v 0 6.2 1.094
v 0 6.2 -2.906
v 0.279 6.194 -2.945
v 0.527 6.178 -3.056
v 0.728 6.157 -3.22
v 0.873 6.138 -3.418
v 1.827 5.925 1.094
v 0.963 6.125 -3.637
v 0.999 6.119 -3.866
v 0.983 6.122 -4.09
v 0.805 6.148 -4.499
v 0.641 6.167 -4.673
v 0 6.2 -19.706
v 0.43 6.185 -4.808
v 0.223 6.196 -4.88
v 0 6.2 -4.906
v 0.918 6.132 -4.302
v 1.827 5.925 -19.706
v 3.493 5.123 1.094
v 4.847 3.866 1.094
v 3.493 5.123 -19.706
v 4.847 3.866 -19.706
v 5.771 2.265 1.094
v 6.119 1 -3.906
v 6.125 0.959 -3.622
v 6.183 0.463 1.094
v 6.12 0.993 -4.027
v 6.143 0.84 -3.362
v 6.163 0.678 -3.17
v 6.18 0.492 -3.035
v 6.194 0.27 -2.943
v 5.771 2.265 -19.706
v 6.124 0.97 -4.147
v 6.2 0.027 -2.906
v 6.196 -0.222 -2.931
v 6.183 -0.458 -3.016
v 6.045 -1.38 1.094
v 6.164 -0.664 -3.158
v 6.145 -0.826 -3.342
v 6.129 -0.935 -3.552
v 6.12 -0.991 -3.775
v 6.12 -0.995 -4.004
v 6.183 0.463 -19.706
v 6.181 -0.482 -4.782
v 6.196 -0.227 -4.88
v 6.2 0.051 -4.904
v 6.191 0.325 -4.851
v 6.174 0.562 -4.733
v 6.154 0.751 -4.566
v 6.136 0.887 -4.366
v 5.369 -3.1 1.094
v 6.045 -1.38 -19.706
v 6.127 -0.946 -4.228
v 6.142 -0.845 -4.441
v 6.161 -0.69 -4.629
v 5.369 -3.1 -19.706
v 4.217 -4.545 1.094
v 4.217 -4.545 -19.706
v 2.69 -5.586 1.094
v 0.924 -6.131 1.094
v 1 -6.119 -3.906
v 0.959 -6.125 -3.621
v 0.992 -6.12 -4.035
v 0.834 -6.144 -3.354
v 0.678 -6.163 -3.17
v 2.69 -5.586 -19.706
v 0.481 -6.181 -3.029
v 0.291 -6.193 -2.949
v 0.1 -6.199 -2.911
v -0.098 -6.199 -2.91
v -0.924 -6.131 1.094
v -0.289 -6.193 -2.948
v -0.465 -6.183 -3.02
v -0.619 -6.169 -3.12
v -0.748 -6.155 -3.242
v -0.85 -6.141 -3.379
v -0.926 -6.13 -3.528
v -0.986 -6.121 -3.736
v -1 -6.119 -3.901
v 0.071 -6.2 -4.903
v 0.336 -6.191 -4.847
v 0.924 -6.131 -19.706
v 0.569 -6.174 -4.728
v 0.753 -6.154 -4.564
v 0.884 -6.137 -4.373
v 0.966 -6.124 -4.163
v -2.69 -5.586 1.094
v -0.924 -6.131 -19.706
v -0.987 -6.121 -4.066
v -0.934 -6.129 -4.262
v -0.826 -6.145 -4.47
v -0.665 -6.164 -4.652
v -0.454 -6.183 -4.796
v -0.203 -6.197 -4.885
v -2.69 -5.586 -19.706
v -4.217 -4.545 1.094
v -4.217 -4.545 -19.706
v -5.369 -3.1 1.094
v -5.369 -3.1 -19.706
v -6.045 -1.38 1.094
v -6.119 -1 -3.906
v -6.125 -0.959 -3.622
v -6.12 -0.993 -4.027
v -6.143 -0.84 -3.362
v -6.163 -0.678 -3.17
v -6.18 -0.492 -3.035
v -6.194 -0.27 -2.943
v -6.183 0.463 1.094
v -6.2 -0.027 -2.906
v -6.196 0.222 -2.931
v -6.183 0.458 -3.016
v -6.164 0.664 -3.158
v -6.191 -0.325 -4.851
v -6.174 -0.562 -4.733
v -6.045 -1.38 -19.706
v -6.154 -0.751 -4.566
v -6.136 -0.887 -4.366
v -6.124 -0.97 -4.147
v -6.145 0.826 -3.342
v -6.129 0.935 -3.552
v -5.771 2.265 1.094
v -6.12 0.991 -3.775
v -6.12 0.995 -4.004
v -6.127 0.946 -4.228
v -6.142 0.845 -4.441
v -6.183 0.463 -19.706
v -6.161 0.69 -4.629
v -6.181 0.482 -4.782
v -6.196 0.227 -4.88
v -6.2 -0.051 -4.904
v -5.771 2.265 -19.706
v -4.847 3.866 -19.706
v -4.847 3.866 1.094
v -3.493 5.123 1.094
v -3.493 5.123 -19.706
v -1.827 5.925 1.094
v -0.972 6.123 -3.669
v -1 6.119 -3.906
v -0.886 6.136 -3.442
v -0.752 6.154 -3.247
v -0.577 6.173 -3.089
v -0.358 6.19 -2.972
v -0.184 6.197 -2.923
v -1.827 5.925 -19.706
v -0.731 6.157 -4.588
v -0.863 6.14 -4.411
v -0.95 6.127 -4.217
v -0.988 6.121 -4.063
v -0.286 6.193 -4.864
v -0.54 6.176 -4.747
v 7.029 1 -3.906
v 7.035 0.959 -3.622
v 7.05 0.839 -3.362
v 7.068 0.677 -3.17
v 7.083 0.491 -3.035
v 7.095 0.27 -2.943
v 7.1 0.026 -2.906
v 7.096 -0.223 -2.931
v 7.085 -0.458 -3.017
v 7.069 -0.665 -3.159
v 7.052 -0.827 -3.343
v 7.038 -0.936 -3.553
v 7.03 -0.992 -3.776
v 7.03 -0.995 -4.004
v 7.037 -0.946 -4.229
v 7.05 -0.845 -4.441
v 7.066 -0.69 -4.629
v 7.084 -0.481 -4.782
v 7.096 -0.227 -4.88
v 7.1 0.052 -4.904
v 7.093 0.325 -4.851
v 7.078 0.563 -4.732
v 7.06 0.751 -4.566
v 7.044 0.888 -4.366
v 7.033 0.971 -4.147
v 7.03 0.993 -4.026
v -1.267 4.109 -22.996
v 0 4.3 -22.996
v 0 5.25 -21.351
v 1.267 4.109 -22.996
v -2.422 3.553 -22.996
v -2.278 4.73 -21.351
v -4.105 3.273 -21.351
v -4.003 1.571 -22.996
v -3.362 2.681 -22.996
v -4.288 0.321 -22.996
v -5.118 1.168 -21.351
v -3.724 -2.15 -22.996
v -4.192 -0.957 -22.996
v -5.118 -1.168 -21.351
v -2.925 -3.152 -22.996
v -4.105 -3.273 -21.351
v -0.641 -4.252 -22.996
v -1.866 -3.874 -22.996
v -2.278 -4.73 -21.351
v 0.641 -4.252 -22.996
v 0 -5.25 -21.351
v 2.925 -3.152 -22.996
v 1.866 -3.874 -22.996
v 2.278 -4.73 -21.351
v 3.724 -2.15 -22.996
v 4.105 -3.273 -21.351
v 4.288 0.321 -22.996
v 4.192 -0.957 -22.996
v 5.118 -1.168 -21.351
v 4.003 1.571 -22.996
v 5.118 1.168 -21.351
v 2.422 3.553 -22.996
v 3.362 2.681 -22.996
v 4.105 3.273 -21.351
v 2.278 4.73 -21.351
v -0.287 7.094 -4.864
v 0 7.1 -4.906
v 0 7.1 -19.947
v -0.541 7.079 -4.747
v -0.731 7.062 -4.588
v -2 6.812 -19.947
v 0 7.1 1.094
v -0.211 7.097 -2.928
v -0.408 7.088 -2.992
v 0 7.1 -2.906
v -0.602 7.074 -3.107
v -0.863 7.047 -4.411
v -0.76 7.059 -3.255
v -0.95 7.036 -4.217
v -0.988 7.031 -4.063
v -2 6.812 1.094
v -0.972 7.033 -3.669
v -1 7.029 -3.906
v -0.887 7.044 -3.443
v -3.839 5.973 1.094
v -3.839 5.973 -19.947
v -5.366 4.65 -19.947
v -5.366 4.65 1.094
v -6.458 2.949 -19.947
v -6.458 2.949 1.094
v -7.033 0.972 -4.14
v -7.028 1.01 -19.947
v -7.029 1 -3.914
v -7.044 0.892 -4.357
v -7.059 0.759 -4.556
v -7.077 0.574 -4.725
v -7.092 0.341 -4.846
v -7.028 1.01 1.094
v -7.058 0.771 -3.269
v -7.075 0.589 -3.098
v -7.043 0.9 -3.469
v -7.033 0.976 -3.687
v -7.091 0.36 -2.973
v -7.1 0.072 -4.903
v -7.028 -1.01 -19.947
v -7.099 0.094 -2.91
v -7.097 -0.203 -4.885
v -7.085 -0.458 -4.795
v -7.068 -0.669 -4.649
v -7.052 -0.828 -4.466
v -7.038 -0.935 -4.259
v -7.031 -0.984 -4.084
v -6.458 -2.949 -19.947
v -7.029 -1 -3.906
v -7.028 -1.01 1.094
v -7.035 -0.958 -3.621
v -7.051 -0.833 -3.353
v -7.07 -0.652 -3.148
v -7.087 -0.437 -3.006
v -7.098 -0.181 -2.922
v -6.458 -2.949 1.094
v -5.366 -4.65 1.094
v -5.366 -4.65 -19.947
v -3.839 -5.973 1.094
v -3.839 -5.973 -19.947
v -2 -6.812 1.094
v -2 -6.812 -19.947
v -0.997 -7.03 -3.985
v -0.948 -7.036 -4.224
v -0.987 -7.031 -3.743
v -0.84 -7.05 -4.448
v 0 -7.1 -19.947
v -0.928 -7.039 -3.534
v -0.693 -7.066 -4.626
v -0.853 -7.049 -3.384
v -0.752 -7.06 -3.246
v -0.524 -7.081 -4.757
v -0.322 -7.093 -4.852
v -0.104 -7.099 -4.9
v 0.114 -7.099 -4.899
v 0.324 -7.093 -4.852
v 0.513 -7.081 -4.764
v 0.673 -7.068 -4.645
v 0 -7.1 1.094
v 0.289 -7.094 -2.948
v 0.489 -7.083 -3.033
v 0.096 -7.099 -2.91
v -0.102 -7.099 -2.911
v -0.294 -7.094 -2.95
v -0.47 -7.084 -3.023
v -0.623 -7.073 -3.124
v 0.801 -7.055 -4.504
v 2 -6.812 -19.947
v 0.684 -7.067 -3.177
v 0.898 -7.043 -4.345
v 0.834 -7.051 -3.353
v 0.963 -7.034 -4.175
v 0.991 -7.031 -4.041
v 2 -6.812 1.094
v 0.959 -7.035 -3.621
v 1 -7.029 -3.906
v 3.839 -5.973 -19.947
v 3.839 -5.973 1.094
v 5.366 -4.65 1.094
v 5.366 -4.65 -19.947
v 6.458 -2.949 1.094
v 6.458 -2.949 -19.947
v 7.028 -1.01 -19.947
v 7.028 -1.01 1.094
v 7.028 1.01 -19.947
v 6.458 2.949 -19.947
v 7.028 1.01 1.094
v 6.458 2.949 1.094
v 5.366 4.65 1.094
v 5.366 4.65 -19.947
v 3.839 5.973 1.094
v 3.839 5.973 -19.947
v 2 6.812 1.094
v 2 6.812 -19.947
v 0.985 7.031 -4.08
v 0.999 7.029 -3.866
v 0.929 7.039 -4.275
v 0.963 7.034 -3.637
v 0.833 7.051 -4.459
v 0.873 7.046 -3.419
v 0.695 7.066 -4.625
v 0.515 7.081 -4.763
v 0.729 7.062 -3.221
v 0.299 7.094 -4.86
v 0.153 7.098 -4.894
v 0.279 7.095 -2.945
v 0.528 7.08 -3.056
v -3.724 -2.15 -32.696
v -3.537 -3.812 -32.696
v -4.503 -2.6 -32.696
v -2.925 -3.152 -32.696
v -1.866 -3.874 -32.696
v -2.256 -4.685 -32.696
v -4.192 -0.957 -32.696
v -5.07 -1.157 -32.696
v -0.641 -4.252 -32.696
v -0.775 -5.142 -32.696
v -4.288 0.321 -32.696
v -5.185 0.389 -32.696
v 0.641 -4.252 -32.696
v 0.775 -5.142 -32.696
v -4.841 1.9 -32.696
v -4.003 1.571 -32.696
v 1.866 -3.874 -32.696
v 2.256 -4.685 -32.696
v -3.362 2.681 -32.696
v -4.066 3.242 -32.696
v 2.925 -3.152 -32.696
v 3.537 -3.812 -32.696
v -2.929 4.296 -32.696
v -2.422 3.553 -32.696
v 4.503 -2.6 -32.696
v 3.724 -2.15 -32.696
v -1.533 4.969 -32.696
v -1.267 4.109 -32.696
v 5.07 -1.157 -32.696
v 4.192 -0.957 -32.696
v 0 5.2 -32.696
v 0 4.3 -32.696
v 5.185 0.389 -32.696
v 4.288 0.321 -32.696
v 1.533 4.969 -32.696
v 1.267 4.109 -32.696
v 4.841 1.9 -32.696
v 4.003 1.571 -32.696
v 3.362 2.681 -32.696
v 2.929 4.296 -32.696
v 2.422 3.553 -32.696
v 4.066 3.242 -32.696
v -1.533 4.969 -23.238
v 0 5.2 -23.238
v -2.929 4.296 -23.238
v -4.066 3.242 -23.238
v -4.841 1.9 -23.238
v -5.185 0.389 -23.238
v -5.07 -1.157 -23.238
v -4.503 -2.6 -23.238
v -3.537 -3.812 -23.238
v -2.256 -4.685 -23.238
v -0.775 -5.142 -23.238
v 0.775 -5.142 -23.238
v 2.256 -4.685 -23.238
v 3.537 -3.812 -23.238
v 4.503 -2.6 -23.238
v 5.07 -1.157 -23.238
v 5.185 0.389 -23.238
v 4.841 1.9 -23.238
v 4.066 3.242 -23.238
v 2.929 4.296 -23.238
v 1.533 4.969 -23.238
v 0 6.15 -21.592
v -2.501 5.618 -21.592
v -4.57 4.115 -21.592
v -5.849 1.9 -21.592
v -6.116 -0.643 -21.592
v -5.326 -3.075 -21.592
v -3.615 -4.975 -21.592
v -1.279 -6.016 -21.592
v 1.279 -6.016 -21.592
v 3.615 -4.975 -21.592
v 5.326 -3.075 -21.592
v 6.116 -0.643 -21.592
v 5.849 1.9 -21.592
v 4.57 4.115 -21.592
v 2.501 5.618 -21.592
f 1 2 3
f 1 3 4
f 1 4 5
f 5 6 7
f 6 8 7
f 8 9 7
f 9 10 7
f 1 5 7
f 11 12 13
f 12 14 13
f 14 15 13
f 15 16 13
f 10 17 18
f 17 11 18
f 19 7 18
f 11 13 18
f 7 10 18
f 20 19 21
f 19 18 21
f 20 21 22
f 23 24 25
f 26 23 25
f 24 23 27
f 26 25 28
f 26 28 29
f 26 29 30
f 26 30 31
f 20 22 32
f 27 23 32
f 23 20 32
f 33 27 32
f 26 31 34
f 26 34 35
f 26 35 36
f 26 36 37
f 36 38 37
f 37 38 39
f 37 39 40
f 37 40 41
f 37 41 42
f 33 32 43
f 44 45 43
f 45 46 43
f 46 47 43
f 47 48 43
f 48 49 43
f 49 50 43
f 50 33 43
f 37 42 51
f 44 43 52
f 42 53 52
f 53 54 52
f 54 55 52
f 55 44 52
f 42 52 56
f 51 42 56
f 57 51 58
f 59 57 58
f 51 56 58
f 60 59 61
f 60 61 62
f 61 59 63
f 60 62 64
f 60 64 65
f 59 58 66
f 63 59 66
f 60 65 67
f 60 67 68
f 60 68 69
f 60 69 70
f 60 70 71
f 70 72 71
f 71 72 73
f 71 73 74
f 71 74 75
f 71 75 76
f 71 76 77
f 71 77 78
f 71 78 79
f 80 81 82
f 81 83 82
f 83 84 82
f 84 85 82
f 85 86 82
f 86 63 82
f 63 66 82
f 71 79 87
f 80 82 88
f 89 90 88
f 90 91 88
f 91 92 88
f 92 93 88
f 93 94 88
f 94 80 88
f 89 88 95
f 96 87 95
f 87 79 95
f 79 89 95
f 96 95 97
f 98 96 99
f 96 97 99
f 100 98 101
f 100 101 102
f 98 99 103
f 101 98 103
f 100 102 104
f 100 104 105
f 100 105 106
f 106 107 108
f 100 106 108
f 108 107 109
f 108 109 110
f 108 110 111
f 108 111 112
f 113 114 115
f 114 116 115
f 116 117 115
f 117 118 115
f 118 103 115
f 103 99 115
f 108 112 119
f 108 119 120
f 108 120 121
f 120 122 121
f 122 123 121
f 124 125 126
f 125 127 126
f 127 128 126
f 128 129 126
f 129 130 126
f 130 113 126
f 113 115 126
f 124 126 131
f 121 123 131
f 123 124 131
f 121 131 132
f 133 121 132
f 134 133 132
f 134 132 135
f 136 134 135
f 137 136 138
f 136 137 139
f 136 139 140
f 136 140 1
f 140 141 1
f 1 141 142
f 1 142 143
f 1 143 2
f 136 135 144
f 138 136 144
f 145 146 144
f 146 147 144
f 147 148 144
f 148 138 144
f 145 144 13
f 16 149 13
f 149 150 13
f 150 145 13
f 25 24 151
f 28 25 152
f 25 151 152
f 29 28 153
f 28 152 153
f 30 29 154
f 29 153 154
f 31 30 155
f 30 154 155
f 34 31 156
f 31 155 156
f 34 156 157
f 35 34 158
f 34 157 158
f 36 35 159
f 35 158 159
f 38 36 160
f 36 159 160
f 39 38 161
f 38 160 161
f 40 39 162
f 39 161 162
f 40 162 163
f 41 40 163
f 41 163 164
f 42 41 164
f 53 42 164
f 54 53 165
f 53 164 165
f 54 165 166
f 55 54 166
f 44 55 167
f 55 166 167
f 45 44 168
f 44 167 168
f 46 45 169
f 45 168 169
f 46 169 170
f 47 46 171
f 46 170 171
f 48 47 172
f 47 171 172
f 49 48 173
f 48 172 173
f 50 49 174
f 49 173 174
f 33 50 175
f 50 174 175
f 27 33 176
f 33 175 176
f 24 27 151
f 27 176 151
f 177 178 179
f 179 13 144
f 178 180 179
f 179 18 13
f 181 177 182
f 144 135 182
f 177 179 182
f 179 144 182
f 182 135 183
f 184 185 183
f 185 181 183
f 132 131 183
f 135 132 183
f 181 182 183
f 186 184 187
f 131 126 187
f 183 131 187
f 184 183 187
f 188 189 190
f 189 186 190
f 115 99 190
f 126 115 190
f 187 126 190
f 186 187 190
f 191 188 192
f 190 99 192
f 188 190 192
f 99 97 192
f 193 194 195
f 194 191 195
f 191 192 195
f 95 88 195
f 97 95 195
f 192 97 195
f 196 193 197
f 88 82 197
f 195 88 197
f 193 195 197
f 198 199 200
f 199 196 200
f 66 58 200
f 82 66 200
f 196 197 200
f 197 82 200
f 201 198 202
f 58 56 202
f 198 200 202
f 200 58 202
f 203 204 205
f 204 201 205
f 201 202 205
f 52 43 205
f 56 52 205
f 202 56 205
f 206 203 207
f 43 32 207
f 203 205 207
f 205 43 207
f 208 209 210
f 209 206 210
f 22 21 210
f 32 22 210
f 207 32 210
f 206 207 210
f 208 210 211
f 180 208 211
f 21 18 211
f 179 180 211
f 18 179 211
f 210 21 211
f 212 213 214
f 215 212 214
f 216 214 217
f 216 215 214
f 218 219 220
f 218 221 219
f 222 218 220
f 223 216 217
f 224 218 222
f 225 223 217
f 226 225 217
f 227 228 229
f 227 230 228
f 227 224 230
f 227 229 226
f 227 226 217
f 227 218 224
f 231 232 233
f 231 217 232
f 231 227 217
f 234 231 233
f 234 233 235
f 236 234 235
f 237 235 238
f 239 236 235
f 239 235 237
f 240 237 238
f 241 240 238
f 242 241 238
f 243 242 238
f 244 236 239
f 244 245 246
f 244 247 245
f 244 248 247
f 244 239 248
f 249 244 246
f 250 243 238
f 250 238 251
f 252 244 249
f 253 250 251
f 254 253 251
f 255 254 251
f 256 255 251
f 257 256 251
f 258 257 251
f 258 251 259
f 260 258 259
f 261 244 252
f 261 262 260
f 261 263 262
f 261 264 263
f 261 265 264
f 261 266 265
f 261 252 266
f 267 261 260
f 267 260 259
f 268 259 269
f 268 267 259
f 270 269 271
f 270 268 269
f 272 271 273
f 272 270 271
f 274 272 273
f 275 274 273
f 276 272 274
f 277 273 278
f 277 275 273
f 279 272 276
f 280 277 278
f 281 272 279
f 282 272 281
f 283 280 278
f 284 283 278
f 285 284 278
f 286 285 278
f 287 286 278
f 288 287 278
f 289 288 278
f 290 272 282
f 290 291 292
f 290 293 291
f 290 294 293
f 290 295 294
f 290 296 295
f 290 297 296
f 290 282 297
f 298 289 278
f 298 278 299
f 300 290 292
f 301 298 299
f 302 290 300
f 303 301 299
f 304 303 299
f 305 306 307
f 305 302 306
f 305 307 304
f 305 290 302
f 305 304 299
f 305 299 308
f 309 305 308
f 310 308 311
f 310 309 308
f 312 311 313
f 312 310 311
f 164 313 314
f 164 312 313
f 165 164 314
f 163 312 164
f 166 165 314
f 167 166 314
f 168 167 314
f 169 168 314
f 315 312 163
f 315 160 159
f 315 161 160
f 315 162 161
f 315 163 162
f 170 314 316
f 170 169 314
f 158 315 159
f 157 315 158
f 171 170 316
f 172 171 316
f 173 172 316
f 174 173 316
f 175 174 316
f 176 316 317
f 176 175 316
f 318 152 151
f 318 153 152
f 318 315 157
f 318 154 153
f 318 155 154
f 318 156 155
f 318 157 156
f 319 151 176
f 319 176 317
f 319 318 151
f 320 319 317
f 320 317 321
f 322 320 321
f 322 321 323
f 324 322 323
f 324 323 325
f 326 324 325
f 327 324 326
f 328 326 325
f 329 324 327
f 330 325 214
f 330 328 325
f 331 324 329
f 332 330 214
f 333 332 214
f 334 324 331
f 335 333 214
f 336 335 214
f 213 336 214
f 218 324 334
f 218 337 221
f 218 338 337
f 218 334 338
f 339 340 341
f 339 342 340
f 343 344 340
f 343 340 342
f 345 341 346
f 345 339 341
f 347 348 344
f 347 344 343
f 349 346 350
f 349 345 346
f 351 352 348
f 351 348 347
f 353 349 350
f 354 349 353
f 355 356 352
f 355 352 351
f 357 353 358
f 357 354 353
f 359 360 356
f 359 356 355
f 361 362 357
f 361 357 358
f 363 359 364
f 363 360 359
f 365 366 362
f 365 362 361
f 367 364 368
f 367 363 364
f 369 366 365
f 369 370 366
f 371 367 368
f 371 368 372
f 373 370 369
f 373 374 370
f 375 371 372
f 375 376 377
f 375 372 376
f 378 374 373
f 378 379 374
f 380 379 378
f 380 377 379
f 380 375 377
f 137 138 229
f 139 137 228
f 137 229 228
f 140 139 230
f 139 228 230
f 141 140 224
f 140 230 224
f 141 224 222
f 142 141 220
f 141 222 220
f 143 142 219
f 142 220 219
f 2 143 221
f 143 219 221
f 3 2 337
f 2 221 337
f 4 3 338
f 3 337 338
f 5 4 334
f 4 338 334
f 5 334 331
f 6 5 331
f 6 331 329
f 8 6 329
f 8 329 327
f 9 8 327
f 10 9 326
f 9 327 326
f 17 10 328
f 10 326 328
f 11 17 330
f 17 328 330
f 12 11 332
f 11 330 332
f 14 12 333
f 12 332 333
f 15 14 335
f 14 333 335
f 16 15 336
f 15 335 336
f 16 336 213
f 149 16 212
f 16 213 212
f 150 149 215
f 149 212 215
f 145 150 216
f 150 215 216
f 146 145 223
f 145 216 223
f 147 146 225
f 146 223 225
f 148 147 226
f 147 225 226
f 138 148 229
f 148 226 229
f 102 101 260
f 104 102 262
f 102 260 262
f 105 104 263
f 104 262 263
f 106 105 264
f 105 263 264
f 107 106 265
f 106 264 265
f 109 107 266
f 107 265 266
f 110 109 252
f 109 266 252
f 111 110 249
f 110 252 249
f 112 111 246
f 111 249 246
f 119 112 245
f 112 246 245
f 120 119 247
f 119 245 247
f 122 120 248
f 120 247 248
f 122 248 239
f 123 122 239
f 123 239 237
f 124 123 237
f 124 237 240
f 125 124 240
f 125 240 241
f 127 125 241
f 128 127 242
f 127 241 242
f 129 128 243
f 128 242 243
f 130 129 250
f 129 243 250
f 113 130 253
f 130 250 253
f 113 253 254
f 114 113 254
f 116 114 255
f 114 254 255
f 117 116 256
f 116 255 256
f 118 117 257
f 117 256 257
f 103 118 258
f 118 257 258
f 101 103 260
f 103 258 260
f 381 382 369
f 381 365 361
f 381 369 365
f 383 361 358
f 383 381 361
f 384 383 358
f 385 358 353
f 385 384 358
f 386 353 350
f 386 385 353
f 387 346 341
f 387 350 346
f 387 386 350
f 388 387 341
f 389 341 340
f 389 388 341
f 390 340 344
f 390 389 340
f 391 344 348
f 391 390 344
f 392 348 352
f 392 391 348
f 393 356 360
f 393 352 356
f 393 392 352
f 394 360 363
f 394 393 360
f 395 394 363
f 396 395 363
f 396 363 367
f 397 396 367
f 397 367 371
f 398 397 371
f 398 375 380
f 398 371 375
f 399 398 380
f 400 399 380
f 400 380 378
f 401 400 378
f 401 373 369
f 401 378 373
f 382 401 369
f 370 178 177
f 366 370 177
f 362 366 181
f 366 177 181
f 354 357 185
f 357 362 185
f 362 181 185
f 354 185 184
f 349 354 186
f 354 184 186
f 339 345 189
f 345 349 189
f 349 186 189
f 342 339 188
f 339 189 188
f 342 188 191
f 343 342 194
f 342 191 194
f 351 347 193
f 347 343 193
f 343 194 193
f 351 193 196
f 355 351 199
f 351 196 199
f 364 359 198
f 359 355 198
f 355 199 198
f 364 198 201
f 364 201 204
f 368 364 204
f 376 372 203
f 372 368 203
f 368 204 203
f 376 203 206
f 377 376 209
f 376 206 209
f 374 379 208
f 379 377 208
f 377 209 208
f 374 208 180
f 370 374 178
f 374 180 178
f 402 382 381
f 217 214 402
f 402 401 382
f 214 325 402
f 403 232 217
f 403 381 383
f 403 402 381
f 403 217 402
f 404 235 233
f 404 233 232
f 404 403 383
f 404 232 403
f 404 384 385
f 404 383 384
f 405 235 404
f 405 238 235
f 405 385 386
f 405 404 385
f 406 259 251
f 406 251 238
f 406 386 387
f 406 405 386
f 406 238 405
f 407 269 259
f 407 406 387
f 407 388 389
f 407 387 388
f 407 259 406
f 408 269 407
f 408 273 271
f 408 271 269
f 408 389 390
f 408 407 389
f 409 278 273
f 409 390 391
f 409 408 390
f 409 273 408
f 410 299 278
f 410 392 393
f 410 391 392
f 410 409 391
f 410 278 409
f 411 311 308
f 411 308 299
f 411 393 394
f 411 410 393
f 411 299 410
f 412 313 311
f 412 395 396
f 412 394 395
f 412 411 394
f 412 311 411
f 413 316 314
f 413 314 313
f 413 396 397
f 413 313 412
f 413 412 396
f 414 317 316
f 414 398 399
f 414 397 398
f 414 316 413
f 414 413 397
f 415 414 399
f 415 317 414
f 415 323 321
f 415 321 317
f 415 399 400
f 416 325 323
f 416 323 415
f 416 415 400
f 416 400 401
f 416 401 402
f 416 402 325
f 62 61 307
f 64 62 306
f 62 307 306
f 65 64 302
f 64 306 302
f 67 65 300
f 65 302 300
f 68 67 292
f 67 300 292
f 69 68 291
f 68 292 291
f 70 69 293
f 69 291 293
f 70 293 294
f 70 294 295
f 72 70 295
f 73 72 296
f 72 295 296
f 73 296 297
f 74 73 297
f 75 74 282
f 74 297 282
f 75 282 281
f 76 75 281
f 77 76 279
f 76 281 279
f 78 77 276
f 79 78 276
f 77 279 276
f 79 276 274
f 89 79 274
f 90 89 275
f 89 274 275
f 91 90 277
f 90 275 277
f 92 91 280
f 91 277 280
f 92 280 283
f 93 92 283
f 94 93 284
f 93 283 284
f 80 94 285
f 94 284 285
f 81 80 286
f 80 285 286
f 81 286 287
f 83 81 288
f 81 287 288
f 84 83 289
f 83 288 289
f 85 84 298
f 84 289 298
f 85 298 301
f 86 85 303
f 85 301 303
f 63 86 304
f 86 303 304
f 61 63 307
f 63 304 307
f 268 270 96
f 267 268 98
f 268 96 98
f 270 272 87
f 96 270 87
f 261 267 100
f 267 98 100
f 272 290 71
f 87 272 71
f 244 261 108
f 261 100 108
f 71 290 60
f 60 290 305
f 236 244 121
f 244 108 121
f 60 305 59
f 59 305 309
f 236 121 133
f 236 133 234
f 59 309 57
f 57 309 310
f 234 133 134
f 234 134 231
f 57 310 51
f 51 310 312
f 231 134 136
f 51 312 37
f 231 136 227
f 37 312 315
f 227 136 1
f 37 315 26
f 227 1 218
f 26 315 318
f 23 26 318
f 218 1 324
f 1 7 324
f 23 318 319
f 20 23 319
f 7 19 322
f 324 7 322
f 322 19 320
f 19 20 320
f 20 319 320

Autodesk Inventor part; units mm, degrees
ref_plane "XZ Plane" through (0, 0, 0) normal (0, 1, 0) x (-1, 0, 0)
ref_plane "XY Plane" through (0, 0, 0) normal (0, 0, 1) x (1, 0, 0)
sketch "Sketch1" plane through (0, 0, 0) normal (1, 0, 0) x (0, 1, 0)
  line L0 (6.2, 1.0944) -> (6.2, -19.7056)
  line L1 (4.3, -32.6965) -> (4.3, -22.9965)
  line L2 (6.2, -19.7056) -> (4.3, -22.9965)
  line L3 (7.1, -19.9467) -> (7.1, 1.0944)
  line L4 (5.2, -32.6965) -> (5.2, -23.2376)
  line L5 (5.2, -23.2376) -> (7.1, -19.9467)
  line L6 (6.2, 1.0944) -> (7.1, 1.0944)
  line L7 (4.3, -32.6965) -> (5.2, -32.6965)
  line L8 (0, 0) -> (0, -7.1245) construction
  dimension "d5" = 6.2
  dimension "d6" = 4.3
  dimension "d7" = 0.9
  dimension "d8" = 0.9
  dimension "d9" = 0.9
  dimension "d10" = 20.8
  dimension "d11" = 9.7
  dimension "d12" = 150
revolve "Revolution1" add sketch "Sketch1" angle 360 about axis through (0, 0, 0) along (0, 0, -1)
ref_plane "Work Plane1" through (8, 0, 0) normal (1, 0, 0) x (0, 1, 0)
sketch "Sketch2" plane through (8, 0, 0) normal (1, 0, 0) x (0, 1, 0)
  line L0 (0, 1.0944) -> (0, -3.9056) construction
  circle A0 centre (0, -3.9056) radius 1
  point P0 (0, 0)
  dimension "d15" = 5
  dimension "d16" = 2
extrude "Extrusion1" cut sketch "Sketch2" against normal blind 10
pattern_circular "Circular Pattern1" count 4 over 360 about axis through (0, 0, -21.351) along (0, 0, -1) of "Extrusion1"
properties part number "fuel"
